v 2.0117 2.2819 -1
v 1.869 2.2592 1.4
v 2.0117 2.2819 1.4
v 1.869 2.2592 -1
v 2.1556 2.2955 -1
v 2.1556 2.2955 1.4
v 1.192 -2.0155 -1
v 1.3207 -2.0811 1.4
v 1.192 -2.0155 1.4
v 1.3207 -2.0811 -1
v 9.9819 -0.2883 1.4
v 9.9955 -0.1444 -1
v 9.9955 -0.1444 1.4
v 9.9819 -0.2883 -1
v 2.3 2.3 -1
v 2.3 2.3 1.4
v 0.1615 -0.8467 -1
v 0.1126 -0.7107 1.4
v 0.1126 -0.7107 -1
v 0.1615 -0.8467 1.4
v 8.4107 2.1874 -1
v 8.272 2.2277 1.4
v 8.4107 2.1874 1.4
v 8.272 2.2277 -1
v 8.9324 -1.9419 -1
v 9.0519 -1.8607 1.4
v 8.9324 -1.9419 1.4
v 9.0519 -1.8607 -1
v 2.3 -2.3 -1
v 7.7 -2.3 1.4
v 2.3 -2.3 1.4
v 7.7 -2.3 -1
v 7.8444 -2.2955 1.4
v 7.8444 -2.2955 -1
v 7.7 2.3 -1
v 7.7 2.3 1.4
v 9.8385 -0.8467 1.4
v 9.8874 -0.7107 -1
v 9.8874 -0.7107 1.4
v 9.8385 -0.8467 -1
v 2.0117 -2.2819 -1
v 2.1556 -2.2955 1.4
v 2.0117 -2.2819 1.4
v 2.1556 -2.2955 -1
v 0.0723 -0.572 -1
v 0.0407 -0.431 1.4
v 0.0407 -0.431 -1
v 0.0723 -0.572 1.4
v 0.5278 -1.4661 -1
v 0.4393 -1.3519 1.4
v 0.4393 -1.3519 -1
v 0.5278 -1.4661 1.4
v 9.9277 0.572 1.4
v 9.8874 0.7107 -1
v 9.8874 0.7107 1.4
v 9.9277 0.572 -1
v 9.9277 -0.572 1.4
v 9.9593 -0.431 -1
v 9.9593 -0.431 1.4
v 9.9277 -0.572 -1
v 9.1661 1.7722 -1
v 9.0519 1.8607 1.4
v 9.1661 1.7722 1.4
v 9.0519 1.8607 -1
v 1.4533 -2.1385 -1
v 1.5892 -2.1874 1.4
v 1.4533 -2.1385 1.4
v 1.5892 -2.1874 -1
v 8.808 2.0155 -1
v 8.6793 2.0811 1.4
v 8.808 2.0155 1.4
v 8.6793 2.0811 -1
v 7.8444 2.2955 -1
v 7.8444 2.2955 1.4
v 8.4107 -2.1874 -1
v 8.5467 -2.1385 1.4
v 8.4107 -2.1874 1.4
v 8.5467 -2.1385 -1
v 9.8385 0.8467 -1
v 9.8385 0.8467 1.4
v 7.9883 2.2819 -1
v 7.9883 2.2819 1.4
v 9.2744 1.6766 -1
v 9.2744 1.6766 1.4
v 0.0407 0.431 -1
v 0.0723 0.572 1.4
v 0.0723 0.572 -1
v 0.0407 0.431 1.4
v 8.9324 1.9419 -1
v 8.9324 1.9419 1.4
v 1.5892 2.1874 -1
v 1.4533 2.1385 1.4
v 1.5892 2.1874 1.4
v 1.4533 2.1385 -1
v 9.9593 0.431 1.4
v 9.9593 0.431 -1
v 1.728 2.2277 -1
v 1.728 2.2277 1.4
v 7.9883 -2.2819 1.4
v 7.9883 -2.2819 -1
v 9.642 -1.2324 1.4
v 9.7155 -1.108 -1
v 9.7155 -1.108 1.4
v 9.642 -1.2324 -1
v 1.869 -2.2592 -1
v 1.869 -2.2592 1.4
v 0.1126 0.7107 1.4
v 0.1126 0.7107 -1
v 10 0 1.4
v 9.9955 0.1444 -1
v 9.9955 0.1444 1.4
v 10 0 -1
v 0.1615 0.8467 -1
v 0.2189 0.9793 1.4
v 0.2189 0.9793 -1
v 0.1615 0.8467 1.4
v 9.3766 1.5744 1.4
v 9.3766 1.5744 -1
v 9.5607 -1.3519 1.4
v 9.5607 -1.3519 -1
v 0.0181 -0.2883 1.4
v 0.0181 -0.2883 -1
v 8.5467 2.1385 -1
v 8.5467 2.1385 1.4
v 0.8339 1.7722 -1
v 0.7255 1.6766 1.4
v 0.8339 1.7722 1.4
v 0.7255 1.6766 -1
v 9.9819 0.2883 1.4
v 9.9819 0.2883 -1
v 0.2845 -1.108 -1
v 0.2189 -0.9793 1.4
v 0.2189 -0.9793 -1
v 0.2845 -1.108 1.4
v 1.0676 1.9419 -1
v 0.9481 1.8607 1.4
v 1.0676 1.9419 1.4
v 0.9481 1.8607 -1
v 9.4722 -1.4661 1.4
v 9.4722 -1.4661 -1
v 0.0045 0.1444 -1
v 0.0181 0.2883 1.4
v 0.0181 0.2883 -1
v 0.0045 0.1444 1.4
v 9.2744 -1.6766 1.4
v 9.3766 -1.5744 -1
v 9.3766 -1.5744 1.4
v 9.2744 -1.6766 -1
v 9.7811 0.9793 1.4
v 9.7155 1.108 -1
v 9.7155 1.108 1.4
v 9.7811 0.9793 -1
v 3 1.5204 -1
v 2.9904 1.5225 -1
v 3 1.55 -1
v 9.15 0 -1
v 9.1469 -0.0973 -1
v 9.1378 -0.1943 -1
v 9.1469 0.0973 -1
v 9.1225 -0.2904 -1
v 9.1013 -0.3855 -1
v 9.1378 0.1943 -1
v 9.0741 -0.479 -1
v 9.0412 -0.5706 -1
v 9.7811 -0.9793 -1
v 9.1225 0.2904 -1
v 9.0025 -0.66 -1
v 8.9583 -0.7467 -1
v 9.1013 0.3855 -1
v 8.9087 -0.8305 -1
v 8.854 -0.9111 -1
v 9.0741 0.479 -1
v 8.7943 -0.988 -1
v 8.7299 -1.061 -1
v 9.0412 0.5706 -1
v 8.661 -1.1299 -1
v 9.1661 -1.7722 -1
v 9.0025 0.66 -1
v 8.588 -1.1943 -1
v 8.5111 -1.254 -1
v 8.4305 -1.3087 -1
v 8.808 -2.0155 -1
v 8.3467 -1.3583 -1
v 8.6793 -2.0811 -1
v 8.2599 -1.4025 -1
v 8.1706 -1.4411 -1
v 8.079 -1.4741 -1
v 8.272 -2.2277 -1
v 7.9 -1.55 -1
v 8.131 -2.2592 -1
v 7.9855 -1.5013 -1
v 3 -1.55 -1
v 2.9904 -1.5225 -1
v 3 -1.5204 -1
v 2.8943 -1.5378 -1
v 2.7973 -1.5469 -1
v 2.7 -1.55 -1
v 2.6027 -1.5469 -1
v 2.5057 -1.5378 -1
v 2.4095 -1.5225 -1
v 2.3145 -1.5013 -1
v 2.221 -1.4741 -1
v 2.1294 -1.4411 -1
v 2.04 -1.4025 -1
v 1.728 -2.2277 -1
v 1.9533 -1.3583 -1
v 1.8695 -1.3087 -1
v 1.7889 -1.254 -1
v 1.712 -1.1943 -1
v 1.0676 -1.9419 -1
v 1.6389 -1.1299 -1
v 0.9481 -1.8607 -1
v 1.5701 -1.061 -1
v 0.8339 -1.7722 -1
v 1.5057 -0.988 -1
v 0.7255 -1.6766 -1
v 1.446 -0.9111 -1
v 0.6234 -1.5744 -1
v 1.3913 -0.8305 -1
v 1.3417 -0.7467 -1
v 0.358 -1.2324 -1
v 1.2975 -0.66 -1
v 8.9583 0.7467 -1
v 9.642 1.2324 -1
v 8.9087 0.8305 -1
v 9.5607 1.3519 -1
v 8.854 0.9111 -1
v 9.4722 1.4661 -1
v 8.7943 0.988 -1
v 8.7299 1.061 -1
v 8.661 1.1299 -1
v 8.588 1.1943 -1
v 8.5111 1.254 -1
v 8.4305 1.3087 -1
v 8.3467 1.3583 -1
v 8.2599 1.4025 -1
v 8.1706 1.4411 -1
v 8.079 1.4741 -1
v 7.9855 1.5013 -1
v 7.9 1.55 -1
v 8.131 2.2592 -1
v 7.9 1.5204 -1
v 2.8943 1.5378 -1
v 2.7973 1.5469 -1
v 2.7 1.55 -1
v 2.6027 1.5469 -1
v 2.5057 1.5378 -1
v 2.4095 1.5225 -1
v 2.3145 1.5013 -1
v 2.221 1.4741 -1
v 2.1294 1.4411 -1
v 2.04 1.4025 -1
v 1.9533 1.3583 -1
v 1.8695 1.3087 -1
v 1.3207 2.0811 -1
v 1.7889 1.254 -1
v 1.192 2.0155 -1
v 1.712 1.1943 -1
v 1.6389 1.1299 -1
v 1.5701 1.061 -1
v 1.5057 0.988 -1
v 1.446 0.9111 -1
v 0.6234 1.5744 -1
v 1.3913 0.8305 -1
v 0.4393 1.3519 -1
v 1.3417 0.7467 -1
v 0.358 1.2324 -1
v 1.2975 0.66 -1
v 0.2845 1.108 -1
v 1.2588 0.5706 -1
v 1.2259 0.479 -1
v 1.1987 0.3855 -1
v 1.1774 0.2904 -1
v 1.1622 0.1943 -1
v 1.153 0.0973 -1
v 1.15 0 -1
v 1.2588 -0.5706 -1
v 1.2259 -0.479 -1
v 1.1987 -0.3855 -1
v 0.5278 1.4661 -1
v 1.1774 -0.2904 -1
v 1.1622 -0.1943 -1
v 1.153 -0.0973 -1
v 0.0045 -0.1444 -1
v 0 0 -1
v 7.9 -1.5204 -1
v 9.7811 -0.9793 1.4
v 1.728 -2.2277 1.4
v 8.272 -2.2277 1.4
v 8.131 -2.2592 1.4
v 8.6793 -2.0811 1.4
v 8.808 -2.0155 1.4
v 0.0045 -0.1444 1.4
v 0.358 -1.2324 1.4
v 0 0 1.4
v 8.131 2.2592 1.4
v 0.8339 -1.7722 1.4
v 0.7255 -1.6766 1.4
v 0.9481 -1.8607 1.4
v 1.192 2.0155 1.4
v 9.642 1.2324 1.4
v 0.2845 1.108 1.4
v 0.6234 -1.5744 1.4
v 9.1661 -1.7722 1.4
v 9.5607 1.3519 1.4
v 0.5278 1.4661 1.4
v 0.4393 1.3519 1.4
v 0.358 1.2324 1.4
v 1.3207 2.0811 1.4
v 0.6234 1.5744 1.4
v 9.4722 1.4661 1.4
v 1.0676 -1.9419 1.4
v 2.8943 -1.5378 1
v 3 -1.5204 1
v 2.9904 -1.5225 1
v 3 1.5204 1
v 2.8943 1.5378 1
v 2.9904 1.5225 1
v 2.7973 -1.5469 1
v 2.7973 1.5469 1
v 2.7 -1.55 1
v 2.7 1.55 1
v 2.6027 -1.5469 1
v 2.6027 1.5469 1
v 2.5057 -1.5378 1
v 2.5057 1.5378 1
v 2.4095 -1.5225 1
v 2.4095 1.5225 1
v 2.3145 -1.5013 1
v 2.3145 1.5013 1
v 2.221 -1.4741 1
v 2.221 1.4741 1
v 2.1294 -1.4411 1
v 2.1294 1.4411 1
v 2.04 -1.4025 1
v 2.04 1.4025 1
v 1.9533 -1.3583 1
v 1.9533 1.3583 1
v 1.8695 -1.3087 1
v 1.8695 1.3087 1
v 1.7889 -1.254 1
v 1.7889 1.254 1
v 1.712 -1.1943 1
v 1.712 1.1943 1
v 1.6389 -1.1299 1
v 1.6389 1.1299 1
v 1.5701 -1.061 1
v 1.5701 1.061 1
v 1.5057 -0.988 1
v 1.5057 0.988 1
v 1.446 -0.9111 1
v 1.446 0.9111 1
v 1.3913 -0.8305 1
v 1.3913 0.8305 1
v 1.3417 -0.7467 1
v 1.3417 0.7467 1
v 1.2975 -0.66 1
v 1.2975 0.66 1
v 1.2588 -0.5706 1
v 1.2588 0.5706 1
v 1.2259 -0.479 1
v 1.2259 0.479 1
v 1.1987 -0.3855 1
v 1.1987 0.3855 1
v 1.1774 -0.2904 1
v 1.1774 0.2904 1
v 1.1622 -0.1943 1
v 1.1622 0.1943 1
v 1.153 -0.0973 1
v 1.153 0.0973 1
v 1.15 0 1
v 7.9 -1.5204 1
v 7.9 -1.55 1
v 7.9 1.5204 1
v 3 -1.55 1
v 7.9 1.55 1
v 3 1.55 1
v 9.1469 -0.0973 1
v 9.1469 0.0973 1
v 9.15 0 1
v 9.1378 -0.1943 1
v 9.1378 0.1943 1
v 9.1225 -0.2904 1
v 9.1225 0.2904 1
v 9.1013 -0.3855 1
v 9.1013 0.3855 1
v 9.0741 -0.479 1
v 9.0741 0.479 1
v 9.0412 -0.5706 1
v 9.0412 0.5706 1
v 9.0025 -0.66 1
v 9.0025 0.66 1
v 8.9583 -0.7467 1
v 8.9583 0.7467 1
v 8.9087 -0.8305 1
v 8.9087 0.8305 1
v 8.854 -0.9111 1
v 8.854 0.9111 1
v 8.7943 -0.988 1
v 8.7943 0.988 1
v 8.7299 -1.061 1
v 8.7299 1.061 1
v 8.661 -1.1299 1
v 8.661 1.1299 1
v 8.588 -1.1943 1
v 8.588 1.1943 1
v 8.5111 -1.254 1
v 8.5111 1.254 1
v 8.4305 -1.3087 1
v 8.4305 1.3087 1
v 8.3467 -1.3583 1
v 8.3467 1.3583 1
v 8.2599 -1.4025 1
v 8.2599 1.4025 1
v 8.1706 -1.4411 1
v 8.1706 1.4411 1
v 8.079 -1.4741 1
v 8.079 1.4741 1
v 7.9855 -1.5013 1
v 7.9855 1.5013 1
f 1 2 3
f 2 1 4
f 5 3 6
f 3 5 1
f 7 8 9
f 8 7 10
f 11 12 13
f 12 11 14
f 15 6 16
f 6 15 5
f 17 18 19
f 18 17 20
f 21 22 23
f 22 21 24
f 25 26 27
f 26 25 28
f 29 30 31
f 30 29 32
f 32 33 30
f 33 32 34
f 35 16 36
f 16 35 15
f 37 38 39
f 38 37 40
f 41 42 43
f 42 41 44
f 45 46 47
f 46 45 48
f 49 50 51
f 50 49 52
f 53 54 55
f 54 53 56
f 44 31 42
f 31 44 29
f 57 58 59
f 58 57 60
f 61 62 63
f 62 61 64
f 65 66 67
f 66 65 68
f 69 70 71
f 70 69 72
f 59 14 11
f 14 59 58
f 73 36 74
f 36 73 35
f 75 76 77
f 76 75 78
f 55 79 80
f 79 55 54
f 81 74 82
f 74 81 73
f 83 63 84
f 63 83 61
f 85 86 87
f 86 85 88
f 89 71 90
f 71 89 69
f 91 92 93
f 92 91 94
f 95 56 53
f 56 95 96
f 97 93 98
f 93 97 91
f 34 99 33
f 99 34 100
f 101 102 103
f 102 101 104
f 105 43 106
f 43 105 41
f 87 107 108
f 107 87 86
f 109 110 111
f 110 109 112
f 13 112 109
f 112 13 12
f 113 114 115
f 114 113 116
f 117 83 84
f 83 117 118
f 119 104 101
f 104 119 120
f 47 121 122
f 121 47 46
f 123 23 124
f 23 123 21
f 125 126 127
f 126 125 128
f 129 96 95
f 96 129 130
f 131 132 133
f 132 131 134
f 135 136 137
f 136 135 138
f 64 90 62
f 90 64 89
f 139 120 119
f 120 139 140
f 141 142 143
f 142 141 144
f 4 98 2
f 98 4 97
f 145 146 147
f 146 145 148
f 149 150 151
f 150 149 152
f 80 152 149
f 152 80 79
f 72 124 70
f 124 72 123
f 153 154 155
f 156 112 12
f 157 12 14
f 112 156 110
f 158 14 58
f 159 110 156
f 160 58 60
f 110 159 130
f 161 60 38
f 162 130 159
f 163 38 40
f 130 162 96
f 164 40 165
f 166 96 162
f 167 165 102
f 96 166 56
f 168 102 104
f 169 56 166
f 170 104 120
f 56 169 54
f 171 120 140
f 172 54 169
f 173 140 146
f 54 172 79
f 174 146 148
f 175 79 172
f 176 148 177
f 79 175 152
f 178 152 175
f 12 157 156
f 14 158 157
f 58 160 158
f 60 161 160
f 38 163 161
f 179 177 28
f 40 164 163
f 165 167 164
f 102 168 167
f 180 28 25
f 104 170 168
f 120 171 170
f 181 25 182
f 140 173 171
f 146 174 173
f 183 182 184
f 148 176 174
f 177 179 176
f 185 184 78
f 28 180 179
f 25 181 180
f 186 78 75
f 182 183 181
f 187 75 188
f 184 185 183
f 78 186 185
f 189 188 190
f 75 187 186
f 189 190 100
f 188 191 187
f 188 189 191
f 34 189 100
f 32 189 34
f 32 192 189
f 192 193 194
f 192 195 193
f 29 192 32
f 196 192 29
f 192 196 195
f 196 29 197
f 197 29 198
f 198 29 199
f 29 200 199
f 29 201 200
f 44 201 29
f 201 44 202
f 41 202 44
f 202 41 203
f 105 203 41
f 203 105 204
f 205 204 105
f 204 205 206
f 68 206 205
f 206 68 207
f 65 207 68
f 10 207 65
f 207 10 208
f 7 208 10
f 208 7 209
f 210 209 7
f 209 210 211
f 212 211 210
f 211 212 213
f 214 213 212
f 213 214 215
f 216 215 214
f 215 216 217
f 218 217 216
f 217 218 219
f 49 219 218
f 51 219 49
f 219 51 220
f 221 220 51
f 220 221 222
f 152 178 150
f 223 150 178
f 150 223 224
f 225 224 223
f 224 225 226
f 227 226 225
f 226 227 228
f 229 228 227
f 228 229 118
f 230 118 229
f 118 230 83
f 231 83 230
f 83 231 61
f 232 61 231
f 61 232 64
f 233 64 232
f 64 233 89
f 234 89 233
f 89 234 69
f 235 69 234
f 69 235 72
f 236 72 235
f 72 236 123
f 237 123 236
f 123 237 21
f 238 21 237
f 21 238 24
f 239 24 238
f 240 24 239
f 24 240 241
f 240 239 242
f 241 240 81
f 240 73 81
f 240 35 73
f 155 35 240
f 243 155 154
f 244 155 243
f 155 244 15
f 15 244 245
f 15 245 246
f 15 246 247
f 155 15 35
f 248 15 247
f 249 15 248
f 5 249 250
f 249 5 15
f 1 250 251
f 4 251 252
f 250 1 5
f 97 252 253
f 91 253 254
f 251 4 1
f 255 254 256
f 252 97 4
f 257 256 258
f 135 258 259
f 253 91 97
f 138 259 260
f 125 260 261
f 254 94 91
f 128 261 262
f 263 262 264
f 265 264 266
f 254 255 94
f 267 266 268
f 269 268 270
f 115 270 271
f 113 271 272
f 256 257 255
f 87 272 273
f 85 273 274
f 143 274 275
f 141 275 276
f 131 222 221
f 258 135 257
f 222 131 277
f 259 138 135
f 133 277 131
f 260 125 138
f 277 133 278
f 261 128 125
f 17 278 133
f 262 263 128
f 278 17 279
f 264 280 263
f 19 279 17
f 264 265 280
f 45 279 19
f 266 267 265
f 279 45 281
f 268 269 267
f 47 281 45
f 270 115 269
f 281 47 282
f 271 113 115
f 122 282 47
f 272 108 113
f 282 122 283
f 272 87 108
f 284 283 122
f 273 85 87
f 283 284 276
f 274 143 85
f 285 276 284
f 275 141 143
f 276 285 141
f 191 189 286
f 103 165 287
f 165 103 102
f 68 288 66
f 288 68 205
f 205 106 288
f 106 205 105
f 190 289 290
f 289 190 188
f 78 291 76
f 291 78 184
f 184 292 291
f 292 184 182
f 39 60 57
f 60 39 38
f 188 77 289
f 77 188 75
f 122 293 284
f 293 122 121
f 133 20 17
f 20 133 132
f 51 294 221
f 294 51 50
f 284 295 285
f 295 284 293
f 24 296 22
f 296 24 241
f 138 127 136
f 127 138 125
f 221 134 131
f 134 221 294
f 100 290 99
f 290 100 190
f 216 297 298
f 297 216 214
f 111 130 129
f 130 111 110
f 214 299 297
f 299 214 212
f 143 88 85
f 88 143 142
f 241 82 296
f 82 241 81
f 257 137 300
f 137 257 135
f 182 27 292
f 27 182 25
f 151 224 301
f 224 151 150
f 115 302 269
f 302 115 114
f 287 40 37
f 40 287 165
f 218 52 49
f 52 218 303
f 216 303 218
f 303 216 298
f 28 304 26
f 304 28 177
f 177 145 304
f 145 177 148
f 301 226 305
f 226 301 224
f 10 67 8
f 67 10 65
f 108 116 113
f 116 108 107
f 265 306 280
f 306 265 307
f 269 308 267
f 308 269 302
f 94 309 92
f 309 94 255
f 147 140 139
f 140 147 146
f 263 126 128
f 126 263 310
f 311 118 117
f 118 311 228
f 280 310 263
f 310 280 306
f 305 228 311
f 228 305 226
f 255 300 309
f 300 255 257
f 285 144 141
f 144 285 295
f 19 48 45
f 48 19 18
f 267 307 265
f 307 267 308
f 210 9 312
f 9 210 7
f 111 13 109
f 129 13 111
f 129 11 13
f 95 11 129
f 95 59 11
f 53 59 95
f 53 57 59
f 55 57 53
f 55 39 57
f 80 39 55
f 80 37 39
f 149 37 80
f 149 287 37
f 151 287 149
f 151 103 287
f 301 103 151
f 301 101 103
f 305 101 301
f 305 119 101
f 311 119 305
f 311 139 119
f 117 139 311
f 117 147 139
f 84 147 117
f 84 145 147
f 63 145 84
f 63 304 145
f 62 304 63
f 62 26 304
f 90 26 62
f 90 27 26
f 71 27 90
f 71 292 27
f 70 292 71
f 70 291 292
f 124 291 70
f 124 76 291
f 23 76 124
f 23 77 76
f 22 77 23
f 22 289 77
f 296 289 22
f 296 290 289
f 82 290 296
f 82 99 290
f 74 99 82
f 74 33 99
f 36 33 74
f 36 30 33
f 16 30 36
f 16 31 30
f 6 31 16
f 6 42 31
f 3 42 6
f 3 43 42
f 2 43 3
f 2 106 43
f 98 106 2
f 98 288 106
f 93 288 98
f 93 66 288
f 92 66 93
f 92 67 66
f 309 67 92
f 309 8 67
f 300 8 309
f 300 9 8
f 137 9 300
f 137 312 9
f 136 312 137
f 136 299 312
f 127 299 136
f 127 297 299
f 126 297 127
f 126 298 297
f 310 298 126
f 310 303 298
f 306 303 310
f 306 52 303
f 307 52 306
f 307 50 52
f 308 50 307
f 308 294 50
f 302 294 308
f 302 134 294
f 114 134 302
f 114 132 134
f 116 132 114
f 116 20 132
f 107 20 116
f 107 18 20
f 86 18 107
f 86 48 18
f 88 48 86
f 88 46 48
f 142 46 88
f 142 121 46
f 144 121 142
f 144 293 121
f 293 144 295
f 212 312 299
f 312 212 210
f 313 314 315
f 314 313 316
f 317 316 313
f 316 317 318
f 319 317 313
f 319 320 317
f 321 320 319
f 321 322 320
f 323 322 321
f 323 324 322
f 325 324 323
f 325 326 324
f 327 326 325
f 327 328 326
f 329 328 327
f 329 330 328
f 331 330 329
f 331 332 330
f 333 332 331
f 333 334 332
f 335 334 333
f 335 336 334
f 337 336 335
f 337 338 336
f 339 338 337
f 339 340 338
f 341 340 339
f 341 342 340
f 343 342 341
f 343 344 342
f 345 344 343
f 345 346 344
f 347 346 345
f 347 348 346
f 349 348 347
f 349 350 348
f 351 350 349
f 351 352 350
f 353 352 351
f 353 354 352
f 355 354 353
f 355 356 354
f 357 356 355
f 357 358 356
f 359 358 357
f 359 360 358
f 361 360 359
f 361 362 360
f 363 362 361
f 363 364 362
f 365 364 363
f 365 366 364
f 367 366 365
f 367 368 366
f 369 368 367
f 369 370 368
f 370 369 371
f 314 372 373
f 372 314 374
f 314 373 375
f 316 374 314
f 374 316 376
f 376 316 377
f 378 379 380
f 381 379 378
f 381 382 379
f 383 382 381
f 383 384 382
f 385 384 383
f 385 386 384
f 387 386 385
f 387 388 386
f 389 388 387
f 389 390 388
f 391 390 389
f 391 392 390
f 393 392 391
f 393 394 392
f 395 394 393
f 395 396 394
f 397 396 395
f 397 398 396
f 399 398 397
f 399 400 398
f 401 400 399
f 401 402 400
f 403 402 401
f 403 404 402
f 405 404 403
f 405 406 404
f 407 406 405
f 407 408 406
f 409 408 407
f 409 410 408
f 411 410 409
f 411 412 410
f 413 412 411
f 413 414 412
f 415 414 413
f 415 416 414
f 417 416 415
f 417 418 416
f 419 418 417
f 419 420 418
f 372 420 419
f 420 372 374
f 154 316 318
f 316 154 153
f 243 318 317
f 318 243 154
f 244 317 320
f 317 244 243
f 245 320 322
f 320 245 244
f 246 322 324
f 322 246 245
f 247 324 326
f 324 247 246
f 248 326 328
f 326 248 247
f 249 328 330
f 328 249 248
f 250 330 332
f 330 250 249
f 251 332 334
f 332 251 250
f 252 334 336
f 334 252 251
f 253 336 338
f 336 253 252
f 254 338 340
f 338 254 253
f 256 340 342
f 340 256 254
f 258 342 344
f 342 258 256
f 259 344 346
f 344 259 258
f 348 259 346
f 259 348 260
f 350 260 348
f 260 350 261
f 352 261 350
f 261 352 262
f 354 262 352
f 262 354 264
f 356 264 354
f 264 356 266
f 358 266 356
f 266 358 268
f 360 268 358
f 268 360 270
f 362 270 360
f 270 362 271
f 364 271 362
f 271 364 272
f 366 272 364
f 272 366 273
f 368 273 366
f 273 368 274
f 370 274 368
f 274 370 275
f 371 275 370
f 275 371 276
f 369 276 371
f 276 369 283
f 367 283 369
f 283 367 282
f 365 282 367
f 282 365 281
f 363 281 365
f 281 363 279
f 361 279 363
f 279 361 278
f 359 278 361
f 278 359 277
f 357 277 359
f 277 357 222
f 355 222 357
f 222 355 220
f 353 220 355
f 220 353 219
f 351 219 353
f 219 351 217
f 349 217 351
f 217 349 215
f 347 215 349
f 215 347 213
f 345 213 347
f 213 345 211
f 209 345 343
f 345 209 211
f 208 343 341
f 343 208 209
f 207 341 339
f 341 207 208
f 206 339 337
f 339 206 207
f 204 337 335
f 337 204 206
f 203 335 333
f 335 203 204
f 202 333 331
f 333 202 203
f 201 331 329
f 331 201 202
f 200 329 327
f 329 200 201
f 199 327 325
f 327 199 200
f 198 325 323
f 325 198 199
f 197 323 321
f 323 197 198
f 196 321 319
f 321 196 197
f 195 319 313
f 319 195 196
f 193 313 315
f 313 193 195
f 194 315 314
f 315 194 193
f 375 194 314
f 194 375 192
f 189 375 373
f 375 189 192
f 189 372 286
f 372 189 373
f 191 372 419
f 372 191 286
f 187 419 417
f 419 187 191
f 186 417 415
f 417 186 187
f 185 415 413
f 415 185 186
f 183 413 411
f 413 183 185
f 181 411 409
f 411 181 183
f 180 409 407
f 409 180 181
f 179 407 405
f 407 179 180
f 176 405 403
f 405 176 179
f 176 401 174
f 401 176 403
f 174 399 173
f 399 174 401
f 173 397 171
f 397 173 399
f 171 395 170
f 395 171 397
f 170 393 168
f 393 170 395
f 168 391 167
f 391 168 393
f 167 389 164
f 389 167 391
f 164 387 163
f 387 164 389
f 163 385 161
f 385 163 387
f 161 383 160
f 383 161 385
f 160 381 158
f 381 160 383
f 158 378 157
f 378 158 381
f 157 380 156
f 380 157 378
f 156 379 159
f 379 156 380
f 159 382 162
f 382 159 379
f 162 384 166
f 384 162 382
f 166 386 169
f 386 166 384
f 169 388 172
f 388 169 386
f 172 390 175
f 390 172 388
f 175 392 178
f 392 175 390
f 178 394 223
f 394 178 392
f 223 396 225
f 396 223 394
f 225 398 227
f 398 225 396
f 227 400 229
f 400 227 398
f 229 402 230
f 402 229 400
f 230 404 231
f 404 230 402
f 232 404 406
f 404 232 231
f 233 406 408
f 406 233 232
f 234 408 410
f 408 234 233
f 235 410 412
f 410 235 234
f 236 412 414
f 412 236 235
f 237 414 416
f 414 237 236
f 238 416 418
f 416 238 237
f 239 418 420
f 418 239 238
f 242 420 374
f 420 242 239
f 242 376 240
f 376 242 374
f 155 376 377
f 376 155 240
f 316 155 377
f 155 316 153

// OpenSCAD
$fn=100;

margin=0.2;
radius=2.5-margin;
innerRadiusPad=0.3;
innerRadius=(2.5/2)+innerRadiusPad;
width=5-(margin*2);
extra=0.4;
length=10;
height=2;

difference() {
    translate([0, 0, -height/2]) linear_extrude(height+0.4) union() {
        translate([radius, 0, 0]) circle(r=radius);
        translate([radius, -radius, 0]) square([length-(radius*2), width], false);
        translate([length-radius, 0, 0]) circle(r=radius);
    }
    translate([0, 0, -height/2]) linear_extrude(height) union() {
        translate([innerRadius*2-extra, 0, 0]) circle(r=innerRadius);
        translate([innerRadius*2+innerRadiusPad-extra, -(innerRadius), 0]) square([(length+innerRadiusPad+extra)-(innerRadius*4)+extra, innerRadius*2], false);
        translate([length-innerRadius*2+innerRadiusPad+extra, 0, 0]) circle(r=innerRadius);
    }
    //translate([0, 0, -height/2]) cylinder(h=height+2, r=1.5);
    //translate([0, -radius, -height]) cube([radius+innerRadiusPad, width, height+1]);
}
